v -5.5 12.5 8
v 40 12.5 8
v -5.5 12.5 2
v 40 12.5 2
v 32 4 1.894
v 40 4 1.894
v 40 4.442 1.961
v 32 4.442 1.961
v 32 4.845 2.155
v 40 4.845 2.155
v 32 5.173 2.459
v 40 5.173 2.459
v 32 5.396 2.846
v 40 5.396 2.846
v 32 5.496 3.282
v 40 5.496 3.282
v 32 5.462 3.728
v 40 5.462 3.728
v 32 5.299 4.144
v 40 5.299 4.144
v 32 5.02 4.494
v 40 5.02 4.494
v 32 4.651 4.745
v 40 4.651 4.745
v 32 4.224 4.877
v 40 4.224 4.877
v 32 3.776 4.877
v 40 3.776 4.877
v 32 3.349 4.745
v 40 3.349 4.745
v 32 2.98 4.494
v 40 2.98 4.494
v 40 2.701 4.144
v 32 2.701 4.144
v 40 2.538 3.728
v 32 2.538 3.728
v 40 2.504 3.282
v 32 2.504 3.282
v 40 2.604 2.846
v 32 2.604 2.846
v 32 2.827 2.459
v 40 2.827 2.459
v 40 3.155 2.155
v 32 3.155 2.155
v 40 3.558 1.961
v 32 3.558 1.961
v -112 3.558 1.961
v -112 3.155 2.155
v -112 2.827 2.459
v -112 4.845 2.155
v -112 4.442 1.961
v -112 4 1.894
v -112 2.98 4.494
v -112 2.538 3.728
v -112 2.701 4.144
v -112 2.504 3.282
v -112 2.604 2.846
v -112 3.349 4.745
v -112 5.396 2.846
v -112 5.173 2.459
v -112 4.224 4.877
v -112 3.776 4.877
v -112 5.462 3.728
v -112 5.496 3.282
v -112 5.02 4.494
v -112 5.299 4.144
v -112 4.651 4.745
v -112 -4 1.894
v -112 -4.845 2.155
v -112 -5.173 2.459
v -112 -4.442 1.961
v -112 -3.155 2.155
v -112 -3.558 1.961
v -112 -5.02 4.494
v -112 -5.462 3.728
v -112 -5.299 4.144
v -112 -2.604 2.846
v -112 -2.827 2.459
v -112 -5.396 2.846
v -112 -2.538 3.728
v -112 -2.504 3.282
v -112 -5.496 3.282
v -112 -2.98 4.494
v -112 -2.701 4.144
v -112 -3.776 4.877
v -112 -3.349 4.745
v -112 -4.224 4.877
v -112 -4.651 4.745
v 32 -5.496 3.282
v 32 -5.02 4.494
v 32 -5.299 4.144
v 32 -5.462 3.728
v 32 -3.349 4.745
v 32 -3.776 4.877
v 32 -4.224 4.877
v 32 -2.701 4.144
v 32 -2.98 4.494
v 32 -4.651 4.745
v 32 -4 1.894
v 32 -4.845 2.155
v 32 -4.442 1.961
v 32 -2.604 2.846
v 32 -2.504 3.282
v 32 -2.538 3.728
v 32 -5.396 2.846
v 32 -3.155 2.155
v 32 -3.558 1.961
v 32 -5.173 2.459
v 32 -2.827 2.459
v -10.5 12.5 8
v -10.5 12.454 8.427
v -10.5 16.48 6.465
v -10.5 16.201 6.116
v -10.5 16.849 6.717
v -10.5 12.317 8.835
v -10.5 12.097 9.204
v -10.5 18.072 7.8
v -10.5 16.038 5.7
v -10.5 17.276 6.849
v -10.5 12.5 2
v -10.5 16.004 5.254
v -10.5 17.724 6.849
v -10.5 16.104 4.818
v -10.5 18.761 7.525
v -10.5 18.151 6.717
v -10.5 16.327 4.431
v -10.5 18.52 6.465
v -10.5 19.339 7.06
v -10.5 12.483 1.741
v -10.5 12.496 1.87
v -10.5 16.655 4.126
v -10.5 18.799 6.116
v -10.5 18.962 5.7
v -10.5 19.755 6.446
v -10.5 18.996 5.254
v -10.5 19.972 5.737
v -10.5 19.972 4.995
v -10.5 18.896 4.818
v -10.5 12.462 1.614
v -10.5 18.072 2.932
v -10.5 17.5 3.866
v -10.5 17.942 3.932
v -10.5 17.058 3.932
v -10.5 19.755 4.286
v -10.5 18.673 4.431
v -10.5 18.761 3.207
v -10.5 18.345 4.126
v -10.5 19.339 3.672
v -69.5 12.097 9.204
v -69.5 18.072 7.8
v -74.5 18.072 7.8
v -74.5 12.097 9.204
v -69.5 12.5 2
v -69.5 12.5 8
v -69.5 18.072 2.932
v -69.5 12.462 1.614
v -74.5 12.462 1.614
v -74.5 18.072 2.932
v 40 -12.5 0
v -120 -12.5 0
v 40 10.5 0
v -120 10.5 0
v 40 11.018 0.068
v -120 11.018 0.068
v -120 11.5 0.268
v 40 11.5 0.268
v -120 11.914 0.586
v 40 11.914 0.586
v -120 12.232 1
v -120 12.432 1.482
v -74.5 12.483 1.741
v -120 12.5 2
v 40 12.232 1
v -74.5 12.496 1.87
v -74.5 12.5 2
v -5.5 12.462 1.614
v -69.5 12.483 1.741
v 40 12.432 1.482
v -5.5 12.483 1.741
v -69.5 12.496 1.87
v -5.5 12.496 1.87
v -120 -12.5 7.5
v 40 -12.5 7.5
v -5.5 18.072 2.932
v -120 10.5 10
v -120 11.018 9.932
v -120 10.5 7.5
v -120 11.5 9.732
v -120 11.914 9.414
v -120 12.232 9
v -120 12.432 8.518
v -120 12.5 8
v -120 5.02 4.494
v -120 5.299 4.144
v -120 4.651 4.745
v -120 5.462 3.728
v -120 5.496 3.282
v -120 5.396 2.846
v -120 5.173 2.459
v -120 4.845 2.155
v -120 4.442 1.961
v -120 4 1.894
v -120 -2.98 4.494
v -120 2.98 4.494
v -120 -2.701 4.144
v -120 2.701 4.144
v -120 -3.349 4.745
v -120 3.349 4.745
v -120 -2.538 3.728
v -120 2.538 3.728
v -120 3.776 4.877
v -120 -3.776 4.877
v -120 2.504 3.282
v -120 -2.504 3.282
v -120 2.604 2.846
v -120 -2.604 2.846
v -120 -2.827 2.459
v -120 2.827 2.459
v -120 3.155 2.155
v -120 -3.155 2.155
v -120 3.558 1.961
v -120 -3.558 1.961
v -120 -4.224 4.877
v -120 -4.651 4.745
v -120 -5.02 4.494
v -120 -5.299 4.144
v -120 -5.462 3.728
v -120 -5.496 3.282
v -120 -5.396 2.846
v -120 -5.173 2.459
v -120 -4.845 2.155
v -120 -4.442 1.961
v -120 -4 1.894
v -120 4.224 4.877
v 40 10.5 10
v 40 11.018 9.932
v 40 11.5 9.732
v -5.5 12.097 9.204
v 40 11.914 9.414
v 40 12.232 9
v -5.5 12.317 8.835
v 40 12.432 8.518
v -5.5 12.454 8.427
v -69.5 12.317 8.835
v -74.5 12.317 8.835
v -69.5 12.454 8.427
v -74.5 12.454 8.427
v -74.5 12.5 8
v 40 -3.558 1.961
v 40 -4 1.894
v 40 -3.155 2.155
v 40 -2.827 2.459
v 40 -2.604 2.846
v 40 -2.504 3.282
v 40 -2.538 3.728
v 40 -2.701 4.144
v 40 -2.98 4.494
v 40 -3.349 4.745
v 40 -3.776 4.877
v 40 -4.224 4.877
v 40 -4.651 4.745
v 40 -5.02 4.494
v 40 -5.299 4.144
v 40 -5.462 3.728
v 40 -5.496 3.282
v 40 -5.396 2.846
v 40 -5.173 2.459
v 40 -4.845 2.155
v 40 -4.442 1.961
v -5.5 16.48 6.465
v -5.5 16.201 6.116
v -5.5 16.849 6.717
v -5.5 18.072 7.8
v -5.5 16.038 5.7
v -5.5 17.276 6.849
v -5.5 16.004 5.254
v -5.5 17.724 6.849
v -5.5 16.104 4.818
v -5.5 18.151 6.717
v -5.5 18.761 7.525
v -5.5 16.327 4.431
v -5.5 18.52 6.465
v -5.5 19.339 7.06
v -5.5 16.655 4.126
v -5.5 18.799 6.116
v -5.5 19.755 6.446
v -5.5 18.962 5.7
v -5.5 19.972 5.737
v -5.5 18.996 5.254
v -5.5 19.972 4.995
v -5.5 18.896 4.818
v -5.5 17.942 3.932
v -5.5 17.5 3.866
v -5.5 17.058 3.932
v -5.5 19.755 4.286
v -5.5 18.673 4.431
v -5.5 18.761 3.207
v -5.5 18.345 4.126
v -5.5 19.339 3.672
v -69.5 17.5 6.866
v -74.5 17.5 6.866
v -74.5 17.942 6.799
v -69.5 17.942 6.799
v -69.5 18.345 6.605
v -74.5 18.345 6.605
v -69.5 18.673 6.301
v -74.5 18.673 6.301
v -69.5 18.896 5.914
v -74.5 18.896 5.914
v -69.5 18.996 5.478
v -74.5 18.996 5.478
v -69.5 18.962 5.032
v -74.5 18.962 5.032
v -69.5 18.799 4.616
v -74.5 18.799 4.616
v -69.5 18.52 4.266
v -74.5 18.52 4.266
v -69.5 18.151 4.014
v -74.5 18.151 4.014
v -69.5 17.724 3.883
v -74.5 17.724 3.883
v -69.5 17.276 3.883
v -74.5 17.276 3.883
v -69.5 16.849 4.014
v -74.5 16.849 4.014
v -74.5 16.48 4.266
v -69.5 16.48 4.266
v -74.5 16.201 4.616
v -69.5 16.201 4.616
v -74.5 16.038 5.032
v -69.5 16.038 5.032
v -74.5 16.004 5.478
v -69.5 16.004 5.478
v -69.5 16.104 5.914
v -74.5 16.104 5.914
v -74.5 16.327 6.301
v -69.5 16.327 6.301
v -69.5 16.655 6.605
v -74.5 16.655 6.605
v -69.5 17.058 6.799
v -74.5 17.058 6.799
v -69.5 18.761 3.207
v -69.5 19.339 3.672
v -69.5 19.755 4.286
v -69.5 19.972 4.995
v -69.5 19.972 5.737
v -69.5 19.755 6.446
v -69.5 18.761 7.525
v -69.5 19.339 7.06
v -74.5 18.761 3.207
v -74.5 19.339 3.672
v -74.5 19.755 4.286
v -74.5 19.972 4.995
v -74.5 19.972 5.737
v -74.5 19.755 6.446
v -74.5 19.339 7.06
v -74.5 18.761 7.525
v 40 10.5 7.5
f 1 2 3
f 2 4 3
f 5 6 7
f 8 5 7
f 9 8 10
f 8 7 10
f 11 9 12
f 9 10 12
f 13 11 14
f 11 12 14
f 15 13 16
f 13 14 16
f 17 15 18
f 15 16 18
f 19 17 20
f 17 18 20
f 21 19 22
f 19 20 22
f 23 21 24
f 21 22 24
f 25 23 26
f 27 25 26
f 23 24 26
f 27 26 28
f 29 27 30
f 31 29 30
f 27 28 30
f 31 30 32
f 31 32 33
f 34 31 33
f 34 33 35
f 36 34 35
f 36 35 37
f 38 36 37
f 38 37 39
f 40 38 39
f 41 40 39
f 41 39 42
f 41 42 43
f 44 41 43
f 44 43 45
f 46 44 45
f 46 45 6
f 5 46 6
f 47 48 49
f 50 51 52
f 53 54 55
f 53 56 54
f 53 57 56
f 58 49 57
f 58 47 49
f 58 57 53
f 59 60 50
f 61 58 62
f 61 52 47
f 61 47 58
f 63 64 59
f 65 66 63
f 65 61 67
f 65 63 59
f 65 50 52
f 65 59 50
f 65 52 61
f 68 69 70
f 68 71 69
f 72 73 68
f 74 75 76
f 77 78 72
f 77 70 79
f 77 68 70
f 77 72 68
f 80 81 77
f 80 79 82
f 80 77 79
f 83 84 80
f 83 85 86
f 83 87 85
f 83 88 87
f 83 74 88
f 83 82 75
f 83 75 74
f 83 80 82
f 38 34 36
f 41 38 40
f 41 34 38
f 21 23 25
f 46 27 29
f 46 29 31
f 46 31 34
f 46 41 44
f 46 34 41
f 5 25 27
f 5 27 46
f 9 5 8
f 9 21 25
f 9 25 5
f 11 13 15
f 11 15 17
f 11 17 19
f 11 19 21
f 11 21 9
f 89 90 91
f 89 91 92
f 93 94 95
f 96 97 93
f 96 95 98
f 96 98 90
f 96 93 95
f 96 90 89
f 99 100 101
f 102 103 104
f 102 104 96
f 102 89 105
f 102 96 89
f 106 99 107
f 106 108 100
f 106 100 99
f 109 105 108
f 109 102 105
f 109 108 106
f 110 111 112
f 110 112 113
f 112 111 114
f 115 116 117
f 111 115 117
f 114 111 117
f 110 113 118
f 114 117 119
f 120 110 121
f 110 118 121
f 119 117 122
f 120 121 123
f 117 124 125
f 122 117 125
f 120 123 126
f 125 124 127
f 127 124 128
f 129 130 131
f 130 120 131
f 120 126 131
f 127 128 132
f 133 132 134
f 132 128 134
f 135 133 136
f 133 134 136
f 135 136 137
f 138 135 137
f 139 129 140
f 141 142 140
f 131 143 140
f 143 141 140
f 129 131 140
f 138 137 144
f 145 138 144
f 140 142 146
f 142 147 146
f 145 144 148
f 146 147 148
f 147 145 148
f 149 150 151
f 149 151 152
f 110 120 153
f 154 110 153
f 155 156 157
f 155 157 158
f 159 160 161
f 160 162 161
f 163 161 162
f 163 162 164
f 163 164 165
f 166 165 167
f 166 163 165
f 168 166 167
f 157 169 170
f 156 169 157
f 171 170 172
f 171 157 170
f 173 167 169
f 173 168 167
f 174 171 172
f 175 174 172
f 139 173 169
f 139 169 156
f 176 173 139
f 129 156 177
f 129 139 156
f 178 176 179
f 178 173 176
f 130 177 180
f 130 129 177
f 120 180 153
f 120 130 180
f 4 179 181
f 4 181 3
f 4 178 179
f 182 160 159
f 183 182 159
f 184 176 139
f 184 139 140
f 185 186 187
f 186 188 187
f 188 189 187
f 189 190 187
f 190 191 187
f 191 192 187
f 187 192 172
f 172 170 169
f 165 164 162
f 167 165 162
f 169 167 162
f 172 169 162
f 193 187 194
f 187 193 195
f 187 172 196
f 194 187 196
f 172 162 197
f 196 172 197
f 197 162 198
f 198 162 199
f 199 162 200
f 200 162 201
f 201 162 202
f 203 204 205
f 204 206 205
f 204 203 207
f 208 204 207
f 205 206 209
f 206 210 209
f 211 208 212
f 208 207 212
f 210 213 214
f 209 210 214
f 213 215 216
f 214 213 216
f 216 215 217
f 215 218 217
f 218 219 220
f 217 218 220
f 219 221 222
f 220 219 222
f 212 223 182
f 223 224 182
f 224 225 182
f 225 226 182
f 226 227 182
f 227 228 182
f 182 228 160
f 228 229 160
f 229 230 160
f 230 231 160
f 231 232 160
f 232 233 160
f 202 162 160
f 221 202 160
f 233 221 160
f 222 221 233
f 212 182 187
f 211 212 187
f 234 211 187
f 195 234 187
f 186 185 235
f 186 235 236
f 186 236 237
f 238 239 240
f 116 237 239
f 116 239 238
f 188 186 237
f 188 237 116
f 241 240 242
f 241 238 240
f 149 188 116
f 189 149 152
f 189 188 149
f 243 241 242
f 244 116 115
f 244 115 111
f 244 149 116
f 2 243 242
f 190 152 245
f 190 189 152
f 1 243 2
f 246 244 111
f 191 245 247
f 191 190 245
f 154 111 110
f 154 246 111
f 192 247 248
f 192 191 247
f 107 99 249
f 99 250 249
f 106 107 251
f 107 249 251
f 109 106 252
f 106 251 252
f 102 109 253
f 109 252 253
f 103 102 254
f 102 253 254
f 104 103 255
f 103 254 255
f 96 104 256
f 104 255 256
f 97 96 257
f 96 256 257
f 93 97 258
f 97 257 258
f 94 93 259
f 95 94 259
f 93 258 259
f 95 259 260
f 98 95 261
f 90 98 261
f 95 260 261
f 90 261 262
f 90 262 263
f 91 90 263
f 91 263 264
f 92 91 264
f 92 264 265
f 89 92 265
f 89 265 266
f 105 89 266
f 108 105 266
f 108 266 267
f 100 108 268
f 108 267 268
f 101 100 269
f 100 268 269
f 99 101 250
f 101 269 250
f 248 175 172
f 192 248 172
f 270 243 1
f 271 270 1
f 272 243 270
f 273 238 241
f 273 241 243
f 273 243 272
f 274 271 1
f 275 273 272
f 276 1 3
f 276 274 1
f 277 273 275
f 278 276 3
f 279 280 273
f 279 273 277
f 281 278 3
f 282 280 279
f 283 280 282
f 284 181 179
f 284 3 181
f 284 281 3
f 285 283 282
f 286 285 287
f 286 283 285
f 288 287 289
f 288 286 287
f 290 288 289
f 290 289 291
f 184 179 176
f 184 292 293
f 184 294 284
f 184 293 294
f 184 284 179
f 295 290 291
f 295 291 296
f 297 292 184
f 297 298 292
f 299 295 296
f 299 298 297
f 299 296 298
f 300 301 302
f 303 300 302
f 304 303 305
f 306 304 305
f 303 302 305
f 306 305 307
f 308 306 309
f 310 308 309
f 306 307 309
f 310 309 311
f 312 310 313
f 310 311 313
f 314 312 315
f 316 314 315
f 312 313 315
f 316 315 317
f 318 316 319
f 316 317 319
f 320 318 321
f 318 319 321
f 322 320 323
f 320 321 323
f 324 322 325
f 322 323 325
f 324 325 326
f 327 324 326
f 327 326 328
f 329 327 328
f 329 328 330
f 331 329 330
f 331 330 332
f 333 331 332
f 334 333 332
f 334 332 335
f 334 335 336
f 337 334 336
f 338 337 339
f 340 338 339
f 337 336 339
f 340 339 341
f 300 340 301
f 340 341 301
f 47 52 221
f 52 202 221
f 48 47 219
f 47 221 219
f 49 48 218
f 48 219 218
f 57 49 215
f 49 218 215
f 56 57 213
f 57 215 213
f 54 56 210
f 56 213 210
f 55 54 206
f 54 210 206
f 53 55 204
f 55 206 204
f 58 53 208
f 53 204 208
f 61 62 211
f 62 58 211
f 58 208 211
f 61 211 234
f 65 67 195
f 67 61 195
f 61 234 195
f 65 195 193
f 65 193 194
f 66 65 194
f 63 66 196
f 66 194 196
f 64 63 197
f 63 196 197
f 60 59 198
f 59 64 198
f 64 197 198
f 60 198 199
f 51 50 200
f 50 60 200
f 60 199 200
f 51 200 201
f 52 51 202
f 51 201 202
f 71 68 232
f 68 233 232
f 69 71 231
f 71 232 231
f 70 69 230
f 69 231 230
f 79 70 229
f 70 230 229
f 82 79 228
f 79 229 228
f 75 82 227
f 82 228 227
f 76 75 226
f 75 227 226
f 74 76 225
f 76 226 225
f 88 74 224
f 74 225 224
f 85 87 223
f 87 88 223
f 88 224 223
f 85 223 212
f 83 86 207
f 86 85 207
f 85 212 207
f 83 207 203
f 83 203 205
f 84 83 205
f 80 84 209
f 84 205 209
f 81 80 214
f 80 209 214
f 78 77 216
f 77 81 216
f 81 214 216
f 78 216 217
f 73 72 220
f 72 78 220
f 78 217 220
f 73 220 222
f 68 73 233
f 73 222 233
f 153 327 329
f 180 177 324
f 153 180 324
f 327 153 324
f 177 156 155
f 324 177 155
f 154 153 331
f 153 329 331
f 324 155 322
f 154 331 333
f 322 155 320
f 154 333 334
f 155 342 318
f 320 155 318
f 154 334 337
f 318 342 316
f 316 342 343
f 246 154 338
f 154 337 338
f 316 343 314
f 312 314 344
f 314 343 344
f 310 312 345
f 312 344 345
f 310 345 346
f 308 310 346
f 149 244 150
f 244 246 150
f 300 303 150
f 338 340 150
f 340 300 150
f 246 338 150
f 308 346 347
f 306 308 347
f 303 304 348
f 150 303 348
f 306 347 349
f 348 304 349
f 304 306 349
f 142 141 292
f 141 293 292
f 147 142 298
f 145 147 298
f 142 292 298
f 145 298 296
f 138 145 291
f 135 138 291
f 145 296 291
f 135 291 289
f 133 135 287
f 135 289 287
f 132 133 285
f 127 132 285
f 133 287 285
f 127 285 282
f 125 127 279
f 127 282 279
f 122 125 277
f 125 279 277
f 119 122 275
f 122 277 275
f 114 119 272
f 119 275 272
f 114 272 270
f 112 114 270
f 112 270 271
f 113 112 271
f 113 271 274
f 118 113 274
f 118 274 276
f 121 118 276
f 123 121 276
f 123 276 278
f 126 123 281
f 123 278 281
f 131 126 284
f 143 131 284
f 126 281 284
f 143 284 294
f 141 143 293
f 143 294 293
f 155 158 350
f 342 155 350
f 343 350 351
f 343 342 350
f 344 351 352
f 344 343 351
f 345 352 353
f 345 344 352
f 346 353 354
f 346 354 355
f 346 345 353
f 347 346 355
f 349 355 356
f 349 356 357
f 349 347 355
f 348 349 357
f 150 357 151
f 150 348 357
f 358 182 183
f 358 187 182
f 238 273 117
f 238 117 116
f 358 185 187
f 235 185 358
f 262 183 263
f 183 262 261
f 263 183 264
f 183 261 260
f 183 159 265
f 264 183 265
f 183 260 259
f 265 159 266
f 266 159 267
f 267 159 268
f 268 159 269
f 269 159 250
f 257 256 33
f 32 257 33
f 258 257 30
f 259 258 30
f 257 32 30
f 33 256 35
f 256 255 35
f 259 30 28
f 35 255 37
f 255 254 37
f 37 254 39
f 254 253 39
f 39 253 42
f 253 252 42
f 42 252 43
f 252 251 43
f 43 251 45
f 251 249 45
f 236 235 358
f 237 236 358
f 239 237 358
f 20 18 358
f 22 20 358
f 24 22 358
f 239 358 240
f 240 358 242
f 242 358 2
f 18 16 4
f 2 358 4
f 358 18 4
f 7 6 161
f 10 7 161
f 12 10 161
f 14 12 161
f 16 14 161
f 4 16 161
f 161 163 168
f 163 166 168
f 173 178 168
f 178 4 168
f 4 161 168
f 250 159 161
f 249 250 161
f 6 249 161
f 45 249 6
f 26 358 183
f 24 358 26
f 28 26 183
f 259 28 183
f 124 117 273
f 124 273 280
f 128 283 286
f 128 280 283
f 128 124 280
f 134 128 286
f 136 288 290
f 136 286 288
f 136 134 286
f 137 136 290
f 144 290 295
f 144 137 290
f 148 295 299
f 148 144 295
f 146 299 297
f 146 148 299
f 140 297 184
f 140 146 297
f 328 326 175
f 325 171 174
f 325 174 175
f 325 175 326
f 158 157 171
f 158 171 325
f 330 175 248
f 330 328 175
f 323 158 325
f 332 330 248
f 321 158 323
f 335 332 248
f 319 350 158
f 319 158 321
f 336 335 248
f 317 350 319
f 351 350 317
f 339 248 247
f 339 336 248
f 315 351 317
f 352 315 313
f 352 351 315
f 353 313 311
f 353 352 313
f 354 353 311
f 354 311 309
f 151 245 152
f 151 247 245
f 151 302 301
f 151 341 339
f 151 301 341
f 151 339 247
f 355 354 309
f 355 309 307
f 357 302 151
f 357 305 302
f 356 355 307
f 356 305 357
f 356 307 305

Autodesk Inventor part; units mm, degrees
sketch "Sketch1" plane through (0, 0, 0) normal (0, 0, 1) x (1, 0, 0)
  line L0 (40, 12.5) -> (-40, 12.5)
  line L1 (-40, 12.5) -> (-40, -12.5)
  line L2 (-40, -12.5) -> (40, -12.5)
  line L3 (40, -12.5) -> (40, 12.5)
  line L4 (40, 12.5) -> (-40, -12.5) construction
  line L5 (-40, 12.5) -> (40, -12.5) construction
  point P0 (0, 0)
  dimension "d0" = 80
  dimension "d1" = 25
extrude "Extrusion1" add sketch "Sketch1" along normal blind 10
ref_plane "Work Plane1" through (-8, -12.5, 0) normal (1, 0, 0) x (0, 0, -1)
sketch "Sketch2" plane through (-8, -12.5, 0) normal (1, 0, 0) x (0, 0, -1)
  circle A0 centre (-5.3658, 30) radius 2.5
  line L0 (0, 25) -> (-10, 25) projected
  line L1 (-9.1092, 25) -> (-7.7995, 30.572)
  line L2 (-2.9321, 30.572) -> (-1.6224, 25)
  point P0 (0, 12.5)
  dimension "d5" = 5
  dimension "d11" = 5
extrude "Extrusion2" add sketch "Sketch2" along normal mid plane 5
sketch "Sketch3" plane through (-5.5, -12.5, 0) normal (1, 0, 0) x (0, 0, -1)
  arc A0 (-2.9321, 30.572) -> (-7.7995, 30.572) centre (-5.3658, 30) ccw projected
  circle A1 centre (-5.3658, 30) radius 1.5
  point P0 (0, 12.5)
  dimension "d8" = 3
extrude "Extrusion3" cut sketch "Sketch3" against normal blind 20
sketch "Sketch4" plane through (0, 0, 0) normal (0, 0, -1) x (-1, 0, 0)
  point P0 (0, 0)
sketch "Sketch5" plane through (-40, -12.5, 0) normal (-1, 0, 0) x (0, 0, 1)
  point P0 (0, 12.5)
ref_plane "Work Plane2" through (-40, -12.5, 0) normal (-1, 0, 0) x (0, 0, 1)
mirror "Mirror1" about plane through (-40, 12.5, 0) normal (-1, 0, 0) of "Extrusion2", "Extrusion1"
fillet "Fillet1" radius 2 2 edges at (-40, 12.5, 10) (-40, 12.5, 0)
sketch "Sketch6" plane through (-74.5, 17.5, 5.3658) normal (-1, 0, 0) x (0, 0, 1)
  circle A0 centre (0, 0) radius 1.5
  point P0 (-5.3658, -17.5)
extrude "Extrusion4" cut sketch "Sketch6" against normal blind 20
ref_plane "Work Plane3" through (20, 10.5, 6) normal (0, 0, -1) x (-1, 0, 0)
sketch "Sketch7" plane through (40, -12.5, 10) normal (1, 0, 0) x (0, 0, -1)
  circle A0 centre (6.606, 16.5) radius 1.5
  circle A1 centre (6.606, 8.5) radius 1.5
  line L0 (10, 0) -> (0, 0) projected
  line L1 (10, 0) -> (10, 23) projected
  point P0 (10, 12.5)
  point P1 (5, 0)
  dimension "d16" = 3
  dimension "d17" = 3
  dimension "d19" = 8.5
  dimension "d20" = 8
  dimension "d32" = 3.394
  dimension "d33" = 3.394
extrude "Extrusion5" cut sketch "Sketch7" against normal blind 8
ref_plane "Work Plane4" through (-120, -12.5, 0) normal (-1, 0, 0) x (0, 0, 1)
mirror "Mirror2" about plane through (-40, -12.5, 0) normal (-1, 0, 0) of "Extrusion5"
thread "Thread1" size "M3x0.5" class "6H" standard "ANSI Metric M Profile" length 10
thread "Thread2" size "M3x0.5" class "6H" standard "ANSI Metric M Profile" length 10
thread "Thread3" size "M3x0.5" class "6H" standard "ANSI Metric M Profile" length 10
thread "Thread4" size "M3x0.5" class "6H" standard "ANSI Metric M Profile" length 10
sketch "Sketch8" plane through (0, 0, 0) normal (0, 0, -1) x (-1, 0, 0)
  line L0 (-40, 10.5) -> (120, 10.5) construction
  line L1 (-40, -12.5) -> (-40, 10.5) construction
  line L2 (-40, -12.5) -> (120, -12.5) construction
  line L3 (120, -12.5) -> (120, 10.5) projected
  point P0 (0, 0)
sketch "Sketch9" plane through (0, 0, 10) normal (0, 0, 1) x (1, 0, 0)
  line L0 (-120, 10.5) -> (40, 10.5) projected
  line L1 (-120, -12.5) -> (-120, 10.5) projected
  line L2 (40, -12.5) -> (-120, -12.5) projected
  line L3 (40, -12.5) -> (40, 10.5) projected
  point P0 (0, 0)
extrude "Extrusion6" cut sketch "Sketch9" against normal blind 2.5
properties part number "plate"
